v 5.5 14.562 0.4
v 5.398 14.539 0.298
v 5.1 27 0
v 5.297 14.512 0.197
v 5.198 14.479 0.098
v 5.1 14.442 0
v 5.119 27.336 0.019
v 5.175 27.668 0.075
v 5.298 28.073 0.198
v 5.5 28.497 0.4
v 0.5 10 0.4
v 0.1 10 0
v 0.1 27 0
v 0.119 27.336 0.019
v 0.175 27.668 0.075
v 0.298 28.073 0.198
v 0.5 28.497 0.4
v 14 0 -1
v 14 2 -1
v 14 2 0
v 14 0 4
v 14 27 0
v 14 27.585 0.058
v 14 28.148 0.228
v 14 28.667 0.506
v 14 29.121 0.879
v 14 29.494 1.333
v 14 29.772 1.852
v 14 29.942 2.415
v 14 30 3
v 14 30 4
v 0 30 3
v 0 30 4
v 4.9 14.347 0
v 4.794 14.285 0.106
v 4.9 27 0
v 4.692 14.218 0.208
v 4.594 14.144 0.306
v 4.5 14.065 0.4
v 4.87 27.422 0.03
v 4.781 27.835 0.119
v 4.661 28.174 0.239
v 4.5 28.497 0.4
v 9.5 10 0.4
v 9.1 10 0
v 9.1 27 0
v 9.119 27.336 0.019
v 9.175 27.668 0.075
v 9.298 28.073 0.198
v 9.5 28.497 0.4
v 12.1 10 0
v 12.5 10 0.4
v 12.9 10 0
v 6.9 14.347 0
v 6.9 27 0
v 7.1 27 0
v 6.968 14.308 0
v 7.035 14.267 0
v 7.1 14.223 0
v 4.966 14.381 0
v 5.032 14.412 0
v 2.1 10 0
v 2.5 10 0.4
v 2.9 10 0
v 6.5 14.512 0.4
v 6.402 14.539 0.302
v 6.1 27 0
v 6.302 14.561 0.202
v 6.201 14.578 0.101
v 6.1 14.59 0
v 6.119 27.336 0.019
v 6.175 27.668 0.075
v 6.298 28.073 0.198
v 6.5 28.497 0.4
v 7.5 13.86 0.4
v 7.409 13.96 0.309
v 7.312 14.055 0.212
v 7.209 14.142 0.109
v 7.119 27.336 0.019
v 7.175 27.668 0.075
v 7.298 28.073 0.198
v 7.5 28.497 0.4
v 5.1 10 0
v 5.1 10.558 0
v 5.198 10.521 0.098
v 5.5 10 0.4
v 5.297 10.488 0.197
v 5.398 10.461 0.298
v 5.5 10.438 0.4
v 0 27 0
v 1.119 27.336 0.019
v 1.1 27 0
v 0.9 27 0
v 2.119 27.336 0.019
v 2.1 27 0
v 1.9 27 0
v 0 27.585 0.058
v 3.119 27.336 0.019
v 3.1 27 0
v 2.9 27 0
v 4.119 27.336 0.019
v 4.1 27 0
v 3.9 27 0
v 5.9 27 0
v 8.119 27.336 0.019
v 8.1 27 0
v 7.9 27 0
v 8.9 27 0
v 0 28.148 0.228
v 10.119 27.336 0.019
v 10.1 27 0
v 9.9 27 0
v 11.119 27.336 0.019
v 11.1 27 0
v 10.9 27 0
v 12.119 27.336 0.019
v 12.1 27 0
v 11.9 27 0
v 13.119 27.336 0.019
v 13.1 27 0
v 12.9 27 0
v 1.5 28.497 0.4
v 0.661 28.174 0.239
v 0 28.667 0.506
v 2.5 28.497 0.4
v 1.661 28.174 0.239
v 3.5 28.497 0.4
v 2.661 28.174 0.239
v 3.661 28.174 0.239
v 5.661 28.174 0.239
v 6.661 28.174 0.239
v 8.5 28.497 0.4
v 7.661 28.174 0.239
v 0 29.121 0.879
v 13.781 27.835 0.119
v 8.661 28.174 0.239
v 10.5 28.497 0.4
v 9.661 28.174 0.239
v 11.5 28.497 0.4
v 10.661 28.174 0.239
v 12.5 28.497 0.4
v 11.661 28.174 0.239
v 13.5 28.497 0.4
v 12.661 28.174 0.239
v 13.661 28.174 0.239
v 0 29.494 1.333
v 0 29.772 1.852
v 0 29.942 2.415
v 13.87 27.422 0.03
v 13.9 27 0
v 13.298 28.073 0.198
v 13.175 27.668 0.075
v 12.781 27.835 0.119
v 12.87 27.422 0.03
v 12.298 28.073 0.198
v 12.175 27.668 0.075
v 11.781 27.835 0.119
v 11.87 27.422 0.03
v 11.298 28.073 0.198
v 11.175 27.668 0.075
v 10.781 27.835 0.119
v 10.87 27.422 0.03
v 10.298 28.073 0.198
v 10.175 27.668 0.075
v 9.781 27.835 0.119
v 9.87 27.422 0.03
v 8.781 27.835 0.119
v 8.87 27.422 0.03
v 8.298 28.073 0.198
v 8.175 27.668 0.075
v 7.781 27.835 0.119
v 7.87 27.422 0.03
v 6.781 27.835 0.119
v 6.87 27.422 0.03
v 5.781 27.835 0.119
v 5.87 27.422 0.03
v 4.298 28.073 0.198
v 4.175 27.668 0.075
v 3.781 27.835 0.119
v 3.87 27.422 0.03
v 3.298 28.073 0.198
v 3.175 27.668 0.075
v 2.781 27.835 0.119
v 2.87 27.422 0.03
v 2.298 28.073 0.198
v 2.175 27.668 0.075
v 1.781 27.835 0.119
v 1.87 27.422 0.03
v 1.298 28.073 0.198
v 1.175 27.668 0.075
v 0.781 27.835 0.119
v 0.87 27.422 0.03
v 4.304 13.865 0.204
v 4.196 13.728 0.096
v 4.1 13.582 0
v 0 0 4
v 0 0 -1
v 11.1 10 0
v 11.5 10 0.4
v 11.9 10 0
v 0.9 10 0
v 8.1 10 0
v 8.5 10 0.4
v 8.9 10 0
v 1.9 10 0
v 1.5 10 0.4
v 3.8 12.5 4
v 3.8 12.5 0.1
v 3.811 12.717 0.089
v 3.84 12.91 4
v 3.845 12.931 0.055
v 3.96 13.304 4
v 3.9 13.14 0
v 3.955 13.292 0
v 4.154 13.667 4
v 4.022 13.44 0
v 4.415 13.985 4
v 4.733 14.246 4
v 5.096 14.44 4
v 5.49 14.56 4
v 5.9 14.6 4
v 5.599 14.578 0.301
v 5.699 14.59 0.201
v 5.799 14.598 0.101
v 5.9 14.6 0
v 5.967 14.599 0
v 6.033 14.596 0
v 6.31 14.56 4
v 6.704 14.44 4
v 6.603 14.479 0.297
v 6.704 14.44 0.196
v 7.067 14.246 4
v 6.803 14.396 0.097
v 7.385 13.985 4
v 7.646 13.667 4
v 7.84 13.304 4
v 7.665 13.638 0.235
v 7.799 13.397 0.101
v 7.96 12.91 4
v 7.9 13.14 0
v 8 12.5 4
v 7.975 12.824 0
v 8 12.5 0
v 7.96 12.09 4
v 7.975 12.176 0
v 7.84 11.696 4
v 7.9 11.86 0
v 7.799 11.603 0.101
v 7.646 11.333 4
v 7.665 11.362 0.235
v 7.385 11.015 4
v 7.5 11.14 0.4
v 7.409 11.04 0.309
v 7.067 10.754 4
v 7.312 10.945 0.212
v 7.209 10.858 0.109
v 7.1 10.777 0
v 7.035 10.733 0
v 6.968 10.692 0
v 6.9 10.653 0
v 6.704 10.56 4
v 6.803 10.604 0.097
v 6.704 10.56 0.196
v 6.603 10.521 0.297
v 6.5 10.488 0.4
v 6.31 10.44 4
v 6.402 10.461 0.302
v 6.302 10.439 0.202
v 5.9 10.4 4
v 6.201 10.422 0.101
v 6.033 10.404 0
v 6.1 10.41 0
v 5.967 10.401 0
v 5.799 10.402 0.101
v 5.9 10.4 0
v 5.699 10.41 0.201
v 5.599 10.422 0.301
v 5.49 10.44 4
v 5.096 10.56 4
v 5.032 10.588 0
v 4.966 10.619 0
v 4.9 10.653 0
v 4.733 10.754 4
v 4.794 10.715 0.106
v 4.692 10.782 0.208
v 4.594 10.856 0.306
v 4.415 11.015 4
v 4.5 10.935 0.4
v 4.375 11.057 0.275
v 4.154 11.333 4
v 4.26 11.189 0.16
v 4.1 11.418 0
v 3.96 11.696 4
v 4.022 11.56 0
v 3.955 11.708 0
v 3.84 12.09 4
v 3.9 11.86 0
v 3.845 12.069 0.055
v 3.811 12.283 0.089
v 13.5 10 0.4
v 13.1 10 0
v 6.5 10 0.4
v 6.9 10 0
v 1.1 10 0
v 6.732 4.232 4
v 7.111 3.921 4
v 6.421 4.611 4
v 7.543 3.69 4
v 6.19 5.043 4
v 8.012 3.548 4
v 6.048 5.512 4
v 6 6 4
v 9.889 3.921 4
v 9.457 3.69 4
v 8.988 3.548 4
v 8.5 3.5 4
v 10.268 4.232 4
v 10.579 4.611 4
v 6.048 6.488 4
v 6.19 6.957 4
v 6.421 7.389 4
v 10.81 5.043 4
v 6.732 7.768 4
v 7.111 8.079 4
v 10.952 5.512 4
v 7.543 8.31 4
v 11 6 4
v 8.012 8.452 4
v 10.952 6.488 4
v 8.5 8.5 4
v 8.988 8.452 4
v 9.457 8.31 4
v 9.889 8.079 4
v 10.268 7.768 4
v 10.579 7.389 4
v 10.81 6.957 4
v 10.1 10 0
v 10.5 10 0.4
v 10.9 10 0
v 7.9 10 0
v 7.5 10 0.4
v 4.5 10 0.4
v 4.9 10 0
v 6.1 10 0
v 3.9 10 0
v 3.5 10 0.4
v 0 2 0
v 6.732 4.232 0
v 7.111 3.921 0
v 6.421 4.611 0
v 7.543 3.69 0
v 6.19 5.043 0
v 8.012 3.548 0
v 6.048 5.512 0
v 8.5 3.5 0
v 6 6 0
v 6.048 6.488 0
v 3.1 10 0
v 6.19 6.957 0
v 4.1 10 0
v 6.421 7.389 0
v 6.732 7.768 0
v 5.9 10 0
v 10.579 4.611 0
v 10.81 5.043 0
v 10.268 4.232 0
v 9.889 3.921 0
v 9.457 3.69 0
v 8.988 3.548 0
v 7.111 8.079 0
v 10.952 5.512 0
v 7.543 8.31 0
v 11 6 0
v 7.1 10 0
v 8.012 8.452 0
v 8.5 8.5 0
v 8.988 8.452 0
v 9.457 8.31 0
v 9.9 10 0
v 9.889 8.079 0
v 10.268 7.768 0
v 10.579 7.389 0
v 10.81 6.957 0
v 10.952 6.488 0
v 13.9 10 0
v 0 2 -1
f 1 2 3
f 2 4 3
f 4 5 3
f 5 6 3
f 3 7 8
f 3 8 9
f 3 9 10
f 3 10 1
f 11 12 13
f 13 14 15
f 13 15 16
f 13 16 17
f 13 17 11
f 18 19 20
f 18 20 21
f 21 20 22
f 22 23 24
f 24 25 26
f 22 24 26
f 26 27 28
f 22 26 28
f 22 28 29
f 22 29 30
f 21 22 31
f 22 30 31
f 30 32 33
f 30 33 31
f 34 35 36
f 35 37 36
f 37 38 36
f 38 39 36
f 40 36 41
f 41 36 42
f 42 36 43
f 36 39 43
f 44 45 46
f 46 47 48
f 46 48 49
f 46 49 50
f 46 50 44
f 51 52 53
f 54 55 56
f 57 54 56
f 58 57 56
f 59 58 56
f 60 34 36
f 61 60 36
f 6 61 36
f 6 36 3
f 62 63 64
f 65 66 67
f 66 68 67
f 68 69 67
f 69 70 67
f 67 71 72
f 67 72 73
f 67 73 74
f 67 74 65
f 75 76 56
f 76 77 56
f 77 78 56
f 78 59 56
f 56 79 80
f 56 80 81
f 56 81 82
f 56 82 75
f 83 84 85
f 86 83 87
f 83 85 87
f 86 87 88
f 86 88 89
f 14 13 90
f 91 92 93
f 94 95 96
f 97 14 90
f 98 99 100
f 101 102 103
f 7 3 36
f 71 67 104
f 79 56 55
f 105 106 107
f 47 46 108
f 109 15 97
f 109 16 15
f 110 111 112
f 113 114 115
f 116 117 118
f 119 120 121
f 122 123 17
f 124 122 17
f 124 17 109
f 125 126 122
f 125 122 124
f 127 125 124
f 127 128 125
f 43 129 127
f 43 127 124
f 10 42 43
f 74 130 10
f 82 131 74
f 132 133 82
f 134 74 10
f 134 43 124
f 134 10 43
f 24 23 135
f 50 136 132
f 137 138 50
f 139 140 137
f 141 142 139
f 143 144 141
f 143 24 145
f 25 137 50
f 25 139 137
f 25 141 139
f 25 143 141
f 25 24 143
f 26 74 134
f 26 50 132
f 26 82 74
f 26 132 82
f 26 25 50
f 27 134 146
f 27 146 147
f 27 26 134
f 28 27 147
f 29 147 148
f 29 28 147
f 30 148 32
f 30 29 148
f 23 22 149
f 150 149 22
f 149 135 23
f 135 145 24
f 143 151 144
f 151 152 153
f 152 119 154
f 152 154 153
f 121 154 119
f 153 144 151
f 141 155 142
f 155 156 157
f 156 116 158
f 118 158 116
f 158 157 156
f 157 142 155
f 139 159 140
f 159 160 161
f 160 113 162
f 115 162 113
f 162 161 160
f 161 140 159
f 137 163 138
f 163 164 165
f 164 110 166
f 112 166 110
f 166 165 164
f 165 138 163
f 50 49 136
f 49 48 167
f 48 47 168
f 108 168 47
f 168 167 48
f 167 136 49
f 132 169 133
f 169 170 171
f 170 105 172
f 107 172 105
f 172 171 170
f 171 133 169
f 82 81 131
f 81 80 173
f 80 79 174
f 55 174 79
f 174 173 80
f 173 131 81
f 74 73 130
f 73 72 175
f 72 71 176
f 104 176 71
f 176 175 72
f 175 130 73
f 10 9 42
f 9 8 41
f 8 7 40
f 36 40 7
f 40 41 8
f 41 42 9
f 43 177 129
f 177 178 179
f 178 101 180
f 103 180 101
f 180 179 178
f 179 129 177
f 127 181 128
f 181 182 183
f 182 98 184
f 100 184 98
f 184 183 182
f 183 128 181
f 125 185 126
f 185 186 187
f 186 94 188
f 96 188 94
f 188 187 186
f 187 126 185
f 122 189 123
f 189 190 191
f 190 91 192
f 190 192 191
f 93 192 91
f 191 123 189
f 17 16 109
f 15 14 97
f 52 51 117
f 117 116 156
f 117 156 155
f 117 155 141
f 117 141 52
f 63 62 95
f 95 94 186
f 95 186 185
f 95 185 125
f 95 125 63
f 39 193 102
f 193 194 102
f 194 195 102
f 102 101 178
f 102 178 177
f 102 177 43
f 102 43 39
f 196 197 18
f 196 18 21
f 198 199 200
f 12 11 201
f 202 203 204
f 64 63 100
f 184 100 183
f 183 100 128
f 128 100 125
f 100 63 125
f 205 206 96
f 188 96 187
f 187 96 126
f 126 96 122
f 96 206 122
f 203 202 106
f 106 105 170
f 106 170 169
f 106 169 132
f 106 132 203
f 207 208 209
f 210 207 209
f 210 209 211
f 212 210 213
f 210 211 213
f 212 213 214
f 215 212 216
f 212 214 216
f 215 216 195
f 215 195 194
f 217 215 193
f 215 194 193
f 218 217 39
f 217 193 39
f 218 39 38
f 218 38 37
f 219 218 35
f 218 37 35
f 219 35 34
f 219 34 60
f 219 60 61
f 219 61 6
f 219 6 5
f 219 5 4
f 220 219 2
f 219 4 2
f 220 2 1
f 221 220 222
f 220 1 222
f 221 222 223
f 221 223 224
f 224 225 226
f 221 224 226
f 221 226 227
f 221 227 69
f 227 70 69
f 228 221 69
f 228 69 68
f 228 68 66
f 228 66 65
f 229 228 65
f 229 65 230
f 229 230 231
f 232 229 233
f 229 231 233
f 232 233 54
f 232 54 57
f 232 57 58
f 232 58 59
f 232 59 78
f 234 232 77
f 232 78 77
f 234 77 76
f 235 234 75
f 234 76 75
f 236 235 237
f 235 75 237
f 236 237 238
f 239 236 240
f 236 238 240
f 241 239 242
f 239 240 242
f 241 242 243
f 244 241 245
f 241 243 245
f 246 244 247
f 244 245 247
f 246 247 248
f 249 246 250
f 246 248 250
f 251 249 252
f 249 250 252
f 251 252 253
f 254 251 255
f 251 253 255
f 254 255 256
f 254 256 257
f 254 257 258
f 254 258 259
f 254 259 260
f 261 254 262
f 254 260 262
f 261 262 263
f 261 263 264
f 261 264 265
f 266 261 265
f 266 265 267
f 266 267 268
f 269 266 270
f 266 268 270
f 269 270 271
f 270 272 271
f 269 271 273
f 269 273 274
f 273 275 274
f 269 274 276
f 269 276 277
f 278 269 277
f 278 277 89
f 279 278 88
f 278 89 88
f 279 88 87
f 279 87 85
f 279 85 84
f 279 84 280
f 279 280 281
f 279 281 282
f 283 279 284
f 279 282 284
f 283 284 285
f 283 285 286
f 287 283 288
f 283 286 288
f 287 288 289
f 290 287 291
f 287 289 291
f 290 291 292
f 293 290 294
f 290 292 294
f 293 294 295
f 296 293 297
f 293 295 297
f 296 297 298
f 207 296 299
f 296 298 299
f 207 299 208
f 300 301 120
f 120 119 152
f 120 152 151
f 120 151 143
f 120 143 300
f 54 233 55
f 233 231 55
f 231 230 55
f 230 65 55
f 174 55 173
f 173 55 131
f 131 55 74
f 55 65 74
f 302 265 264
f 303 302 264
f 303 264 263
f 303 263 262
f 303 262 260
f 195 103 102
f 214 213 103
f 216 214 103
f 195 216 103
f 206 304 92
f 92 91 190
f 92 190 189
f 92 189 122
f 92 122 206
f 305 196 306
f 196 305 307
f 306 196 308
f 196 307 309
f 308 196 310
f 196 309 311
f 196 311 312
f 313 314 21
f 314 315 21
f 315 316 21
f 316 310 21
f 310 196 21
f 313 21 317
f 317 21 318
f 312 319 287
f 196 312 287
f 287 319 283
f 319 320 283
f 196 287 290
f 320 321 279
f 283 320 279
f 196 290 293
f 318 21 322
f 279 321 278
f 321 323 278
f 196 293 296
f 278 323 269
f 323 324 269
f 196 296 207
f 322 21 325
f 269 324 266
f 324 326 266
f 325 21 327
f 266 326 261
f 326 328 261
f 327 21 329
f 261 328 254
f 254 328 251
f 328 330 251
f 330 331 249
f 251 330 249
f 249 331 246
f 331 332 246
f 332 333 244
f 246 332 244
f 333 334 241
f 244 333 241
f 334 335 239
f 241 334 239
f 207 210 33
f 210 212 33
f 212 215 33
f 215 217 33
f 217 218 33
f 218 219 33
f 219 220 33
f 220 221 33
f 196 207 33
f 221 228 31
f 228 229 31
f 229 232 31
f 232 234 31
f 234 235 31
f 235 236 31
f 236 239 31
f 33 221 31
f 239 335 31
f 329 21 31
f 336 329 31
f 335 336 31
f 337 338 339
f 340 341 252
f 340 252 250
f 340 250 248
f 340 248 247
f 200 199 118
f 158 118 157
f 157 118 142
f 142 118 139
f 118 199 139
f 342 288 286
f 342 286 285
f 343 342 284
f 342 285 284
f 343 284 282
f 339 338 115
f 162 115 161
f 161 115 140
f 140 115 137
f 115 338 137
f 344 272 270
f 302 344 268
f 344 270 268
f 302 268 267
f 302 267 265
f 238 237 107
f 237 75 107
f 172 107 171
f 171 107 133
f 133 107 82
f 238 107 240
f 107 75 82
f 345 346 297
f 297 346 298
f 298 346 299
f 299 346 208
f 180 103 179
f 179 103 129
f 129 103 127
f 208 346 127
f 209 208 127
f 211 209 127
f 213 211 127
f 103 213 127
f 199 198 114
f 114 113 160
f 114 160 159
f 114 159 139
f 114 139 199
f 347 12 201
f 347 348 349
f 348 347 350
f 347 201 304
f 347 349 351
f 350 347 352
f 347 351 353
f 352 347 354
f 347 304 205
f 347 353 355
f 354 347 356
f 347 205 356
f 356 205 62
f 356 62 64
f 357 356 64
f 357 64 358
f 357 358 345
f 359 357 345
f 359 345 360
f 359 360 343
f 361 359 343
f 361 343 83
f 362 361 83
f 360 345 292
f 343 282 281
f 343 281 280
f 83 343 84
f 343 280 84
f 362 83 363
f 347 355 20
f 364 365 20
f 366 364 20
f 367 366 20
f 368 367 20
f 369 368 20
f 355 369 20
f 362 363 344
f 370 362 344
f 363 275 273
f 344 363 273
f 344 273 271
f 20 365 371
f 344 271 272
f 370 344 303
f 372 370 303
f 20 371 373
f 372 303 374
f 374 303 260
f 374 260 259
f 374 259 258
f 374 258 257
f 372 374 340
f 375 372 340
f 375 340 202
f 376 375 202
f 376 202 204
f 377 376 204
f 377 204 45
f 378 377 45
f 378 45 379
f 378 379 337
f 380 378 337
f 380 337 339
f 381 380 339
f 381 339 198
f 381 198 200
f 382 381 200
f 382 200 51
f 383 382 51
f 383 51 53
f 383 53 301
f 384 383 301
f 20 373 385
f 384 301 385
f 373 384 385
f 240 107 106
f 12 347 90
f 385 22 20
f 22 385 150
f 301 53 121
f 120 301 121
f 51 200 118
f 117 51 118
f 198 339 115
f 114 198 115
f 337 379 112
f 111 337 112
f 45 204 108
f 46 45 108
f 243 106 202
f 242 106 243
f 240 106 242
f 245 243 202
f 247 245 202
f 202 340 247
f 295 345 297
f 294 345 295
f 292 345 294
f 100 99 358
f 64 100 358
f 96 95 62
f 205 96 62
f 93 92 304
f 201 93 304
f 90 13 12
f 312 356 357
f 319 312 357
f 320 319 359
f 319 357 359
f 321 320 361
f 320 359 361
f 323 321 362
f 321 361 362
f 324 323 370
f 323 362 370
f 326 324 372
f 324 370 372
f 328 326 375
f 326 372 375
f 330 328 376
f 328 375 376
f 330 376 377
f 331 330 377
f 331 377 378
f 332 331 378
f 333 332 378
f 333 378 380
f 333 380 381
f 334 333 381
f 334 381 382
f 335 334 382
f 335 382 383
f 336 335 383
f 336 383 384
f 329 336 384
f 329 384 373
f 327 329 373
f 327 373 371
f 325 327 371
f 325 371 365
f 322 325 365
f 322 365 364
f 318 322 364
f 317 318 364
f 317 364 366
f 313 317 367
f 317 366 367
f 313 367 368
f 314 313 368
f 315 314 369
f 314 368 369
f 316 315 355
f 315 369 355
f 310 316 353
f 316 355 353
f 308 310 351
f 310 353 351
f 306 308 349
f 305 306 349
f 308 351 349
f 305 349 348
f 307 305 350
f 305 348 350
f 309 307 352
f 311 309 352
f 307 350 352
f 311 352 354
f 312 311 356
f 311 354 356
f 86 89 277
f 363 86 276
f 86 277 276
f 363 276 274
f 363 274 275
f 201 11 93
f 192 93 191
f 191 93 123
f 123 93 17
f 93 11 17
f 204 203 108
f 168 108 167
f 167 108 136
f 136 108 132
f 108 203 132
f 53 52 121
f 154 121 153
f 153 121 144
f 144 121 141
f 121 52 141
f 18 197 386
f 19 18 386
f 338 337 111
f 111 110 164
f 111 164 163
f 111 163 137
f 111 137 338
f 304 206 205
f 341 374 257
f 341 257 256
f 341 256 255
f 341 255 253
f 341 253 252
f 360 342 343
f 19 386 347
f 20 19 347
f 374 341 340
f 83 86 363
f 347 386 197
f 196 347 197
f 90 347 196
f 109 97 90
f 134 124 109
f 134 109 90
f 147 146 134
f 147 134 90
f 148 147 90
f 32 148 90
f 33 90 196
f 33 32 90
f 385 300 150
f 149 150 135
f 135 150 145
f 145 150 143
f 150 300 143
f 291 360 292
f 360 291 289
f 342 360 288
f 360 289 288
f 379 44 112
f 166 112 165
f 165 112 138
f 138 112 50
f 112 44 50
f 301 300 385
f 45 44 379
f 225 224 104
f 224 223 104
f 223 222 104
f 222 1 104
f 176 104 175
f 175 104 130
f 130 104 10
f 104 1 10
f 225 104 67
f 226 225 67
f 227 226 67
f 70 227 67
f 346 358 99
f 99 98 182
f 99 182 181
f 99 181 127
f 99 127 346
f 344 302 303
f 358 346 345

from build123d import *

# Parameters (mm, degrees)
ESQUISSE1_W                = 14
ESQUISSE1_H                = 30
BASE_EXTRUSION_DEPTH       = 5
ESQUISSE2_W                = 4
ESQUISSE2_H                = 29
ENL_V_MAT_EXTRU_2_DEPTH    = 34.481338086
CONG_2_R                   = 3
ENL_V_MAT_EXTRU_3_DEPTH    = 20
R_P_TITION_LIN_AIRE1_COUNT = 14
R_P_TITION_LIN_AIRE1_PITCH = 1
ESQUISSE10_W               = 2
ESQUISSE10_H               = 3
ENL_V_MAT_EXTRU_17_DEPTH   = 20
ESQUISSE11_W               = 2
ESQUISSE11_H               = 2
BOSS_EXTRU_2_DEPTH         = 14
ESQUISSE12_R               = 2.5
ENL_V_MAT_EXTRU_18_DEPTH   = 34.346664001
ESQUISSE13_R               = 2.1
ENL_V_MAT_EXTRU_19_DEPTH   = 14


with BuildPart() as part:
    # Esquisse1 → Base-Extrusion (new body)
    with BuildSketch(Plane.XY):
        with Locations((7, 15)):
            Rectangle(ESQUISSE1_W, ESQUISSE1_H)
    extrude(amount=BASE_EXTRUSION_DEPTH)

    # Esquisse2 → Enlèv. mat.-Extru.2 (cut, through all)
    with BuildSketch(Plane(origin=(14, 0, 0), x_dir=(0, 0, -1), z_dir=(1, 0, 0))):
        with Locations((-6, 16.5)):
            Rectangle(ESQUISSE2_W, ESQUISSE2_H)
    extrude(amount=-ENL_V_MAT_EXTRU_2_DEPTH, mode=Mode.SUBTRACT)

    # Congé2
    cong_2_edges = [part.edges().sort_by_distance(p)[0] for p in [
        (7, 30, 0),
    ]]
    fillet(cong_2_edges, radius=CONG_2_R)

    # Esquisse3 → Enlèv. mat.-Extru.3 (cut)
    with BuildSketch(Plane(origin=(0, 30, 0), x_dir=(-1, 0, 0), z_dir=(0, 1, 0))):
        Polygon((-13.9, 0), (-13.1, 0), (-13.5, 0.4), align=None)
    enl_v_mat_extru_3 = extrude(amount=-ENL_V_MAT_EXTRU_3_DEPTH, mode=Mode.SUBTRACT)

    # Répétition linéaire1: Enlèv. mat.-Extru.3 ×14
    with Locations(*[(-i * R_P_TITION_LIN_AIRE1_PITCH, 0, 0) for i in range(1, R_P_TITION_LIN_AIRE1_COUNT)]):
        add(enl_v_mat_extru_3, mode=Mode.SUBTRACT)

    # Esquisse10 → Enlèv. mat.-Extru.17 (cut)
    with BuildSketch(Plane.ZY):
        with Locations((5, 0.5)):
            Rectangle(ESQUISSE10_W, ESQUISSE10_H)
    extrude(amount=-ENL_V_MAT_EXTRU_17_DEPTH, mode=Mode.SUBTRACT)

    # Esquisse11 → Boss.-Extru.2 (add)
    with BuildSketch(Plane.ZY):
        with Locations((0, 1)):
            Rectangle(ESQUISSE11_W, ESQUISSE11_H)
    extrude(amount=-BOSS_EXTRU_2_DEPTH)

    # Esquisse12 → Enlèv. mat.-Extru.18 (cut, through all)
    with BuildSketch(Plane(origin=(0, 0, 0), x_dir=(-1, 0, 0), z_dir=(0, 0, -1))):
        with Locations((-8.5, 6)):
            Circle(ESQUISSE12_R)
    extrude(amount=-ENL_V_MAT_EXTRU_18_DEPTH, mode=Mode.SUBTRACT)

    # Esquisse13 → Enlèv. mat.-Extru.19 (cut)
    with BuildSketch(Plane(origin=(0, 0, 0), x_dir=(-1, 0, 0), z_dir=(0, 0, -1))):
        with Locations((-5.9, 12.5)):
            Circle(ESQUISSE13_R)
    extrude(amount=-ENL_V_MAT_EXTRU_19_DEPTH, mode=Mode.SUBTRACT)


solid = part.part
